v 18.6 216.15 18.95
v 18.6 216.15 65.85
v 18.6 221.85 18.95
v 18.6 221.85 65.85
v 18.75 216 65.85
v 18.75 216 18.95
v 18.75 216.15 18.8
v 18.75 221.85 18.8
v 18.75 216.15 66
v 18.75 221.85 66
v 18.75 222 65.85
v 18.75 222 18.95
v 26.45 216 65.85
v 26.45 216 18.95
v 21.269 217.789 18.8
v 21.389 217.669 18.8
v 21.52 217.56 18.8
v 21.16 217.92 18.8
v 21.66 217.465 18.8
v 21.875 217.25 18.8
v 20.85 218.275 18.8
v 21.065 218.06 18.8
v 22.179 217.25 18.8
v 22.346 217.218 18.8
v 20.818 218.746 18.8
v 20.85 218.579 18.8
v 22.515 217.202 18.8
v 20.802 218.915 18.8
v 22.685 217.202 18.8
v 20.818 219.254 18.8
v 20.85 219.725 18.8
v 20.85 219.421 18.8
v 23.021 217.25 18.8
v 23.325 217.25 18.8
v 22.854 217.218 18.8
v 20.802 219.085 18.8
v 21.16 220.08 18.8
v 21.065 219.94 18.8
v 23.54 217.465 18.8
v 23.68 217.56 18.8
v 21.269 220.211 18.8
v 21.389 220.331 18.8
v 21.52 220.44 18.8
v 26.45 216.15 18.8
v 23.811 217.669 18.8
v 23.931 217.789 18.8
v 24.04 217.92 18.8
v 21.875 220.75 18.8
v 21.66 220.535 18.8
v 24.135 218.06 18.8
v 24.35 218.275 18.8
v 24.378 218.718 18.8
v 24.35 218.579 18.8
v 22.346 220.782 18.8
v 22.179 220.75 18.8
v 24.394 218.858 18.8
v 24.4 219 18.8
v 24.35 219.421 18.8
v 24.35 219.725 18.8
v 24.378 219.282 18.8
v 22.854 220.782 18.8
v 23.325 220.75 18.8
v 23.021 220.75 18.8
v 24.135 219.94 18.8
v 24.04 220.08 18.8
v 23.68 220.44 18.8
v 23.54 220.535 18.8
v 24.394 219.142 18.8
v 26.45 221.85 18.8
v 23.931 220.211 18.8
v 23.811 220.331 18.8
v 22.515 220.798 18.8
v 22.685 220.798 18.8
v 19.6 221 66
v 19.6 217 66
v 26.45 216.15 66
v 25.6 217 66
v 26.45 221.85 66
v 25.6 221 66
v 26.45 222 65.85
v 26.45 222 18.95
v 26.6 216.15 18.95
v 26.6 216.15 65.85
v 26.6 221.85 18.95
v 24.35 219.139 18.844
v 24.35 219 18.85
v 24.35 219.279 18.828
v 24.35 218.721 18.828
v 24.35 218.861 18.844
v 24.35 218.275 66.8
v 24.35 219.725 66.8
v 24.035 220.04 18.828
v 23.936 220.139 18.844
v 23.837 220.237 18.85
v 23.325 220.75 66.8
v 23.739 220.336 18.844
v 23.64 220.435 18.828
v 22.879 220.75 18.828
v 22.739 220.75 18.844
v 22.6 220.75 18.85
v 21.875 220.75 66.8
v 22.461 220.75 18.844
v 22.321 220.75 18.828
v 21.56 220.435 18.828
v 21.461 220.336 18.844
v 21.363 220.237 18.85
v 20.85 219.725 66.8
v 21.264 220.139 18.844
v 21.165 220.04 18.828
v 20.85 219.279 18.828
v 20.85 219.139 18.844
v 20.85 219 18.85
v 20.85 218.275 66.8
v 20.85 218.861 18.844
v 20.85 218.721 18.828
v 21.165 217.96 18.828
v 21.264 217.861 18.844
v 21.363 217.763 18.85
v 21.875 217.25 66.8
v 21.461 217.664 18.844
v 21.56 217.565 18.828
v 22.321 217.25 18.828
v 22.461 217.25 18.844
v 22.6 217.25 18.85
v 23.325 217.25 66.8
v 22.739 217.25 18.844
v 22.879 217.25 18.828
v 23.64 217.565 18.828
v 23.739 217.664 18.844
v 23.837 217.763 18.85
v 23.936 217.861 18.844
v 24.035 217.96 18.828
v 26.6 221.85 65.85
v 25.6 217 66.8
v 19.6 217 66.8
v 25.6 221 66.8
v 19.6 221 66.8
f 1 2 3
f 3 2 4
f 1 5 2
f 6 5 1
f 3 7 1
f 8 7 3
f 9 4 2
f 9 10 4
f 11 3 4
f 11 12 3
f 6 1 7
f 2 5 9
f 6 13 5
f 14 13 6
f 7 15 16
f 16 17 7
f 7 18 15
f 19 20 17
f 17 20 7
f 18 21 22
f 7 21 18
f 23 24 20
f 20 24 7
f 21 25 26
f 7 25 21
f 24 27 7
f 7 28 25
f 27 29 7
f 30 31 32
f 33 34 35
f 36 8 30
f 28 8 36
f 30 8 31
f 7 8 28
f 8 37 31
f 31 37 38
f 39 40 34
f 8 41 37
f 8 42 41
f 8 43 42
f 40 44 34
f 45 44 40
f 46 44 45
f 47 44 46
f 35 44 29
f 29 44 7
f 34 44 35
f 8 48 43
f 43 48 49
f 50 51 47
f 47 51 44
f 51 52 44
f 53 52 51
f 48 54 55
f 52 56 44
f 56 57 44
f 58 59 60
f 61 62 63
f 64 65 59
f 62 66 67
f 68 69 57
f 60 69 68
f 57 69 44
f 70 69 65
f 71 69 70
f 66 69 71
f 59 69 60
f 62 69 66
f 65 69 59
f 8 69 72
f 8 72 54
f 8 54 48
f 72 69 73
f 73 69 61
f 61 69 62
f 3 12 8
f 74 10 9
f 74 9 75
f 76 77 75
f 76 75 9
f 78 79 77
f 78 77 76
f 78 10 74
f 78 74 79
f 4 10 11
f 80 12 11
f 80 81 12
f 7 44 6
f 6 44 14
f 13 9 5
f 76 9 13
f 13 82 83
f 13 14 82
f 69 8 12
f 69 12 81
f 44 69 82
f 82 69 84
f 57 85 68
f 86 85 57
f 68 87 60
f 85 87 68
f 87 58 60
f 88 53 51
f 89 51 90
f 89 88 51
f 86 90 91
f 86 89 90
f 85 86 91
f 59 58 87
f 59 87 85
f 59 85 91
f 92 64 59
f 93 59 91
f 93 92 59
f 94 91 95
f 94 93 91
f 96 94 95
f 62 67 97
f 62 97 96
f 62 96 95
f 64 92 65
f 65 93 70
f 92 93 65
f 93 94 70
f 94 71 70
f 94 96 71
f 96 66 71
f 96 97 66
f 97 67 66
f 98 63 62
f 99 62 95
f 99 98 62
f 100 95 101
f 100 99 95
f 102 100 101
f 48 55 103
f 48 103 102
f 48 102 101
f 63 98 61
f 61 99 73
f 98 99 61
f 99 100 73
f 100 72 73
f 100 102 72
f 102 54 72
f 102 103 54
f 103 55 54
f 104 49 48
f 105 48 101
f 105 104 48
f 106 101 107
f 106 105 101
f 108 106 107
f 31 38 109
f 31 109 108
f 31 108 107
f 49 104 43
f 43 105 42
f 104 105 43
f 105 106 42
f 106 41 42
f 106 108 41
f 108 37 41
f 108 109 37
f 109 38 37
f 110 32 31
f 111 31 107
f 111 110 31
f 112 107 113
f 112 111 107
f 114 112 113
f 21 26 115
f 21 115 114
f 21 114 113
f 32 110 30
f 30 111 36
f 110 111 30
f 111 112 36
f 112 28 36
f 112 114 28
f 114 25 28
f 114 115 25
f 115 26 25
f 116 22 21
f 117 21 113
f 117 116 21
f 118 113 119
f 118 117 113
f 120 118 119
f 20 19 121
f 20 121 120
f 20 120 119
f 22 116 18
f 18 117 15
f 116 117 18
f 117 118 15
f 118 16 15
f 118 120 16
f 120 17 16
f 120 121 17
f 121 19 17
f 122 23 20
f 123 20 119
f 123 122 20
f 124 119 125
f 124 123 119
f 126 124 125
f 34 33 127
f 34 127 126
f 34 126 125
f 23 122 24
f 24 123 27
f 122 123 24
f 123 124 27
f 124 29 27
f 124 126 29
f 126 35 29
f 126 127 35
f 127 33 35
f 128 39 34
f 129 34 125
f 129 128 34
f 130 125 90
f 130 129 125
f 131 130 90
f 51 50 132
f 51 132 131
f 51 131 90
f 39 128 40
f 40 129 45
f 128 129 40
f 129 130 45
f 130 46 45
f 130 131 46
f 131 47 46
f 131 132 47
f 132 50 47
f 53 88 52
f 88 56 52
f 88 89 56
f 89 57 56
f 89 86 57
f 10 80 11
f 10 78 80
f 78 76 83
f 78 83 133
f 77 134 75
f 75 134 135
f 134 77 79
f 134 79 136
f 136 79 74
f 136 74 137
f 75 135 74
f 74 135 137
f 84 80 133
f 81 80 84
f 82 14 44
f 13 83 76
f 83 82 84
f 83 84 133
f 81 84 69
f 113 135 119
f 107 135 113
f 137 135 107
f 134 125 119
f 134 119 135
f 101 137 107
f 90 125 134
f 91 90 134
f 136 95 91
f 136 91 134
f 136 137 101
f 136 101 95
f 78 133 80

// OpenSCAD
// Generated by the canonical parent Python sources and validated exchange pipeline.
polyhedron(points=[[18.600000381469727, 216.14999389648438, 18.950000762939453], [18.600000381469727, 216.14999389648438, 65.8499984741211], [18.600000381469727, 221.85000610351562, 18.950000762939453], [18.600000381469727, 221.85000610351562, 65.8499984741211], [18.75, 216.0, 65.8499984741211], [18.75, 216.0, 18.950000762939453], [18.75, 216.14999389648438, 18.799999237060547], [18.75, 221.85000610351562, 18.799999237060547], [18.75, 216.14999389648438, 66.0], [18.75, 221.85000610351562, 66.0], [18.75, 222.0, 65.8499984741211], [18.75, 222.0, 18.950000762939453], [26.450000762939453, 216.0, 65.8499984741211], [26.450000762939453, 216.0, 18.950000762939453], [21.268510818481445, 217.7887420654297, 18.799999237060547], [21.38874626159668, 217.66851806640625, 18.799999237060547], [21.51978874206543, 217.56016540527344, 18.799999237060547], [21.160158157348633, 217.91978454589844, 18.799999237060547], [21.660472869873047, 217.46466064453125, 18.799999237060547], [21.875125885009766, 217.25, 18.799999237060547], [20.850000381469727, 218.27513122558594, 18.799999237060547], [21.064653396606445, 218.0604705810547, 18.799999237060547], [22.178691864013672, 217.25, 18.799999237060547], [22.345703125, 217.21804809570312, 18.799999237060547], [20.81805419921875, 218.74569702148438, 18.799999237060547], [20.850000381469727, 218.5786895751953, 18.799999237060547], [22.51498031616211, 217.20201110839844, 18.799999237060547], [20.80200958251953, 218.91497802734375, 18.799999237060547], [22.68501853942871, 217.20201110839844, 18.799999237060547], [20.81805419921875, 219.25430297851562, 18.799999237060547], [20.850000381469727, 219.72486877441406, 18.799999237060547], [20.850000381469727, 219.4213104248047, 18.799999237060547], [23.02130699157715, 217.25, 18.799999237060547], [23.324872970581055, 217.25, 18.799999237060547], [22.854297637939453, 217.21804809570312, 18.799999237060547], [20.80200958251953, 219.08502197265625, 18.799999237060547], [21.160158157348633, 220.08021545410156, 18.799999237060547], [21.064653396606445, 219.9395294189453, 18.799999237060547], [23.539527893066406, 217.46466064453125, 18.799999237060547], [23.68021011352539, 217.56016540527344, 18.799999237060547], [21.268510818481445, 220.2112579345703, 18.799999237060547], [21.38874626159668, 220.33148193359375, 18.799999237060547], [21.51978874206543, 220.43983459472656, 18.799999237060547], [26.450000762939453, 216.14999389648438, 18.799999237060547], [23.811254501342773, 217.66851806640625, 18.799999237060547], [23.931489944458008, 217.7887420654297, 18.799999237060547], [24.03984260559082, 217.91978454589844, 18.799999237060547], [21.875125885009766, 220.75, 18.799999237060547], [21.660472869873047, 220.53533935546875, 18.799999237060547], [24.135345458984375, 218.0604705810547, 18.799999237060547], [24.350000381469727, 218.27513122558594, 18.799999237060547], [24.37771987915039, 218.71766662597656, 18.799999237060547], [24.350000381469727, 218.5786895751953, 18.799999237060547], [22.345703125, 220.78195190429688, 18.799999237060547], [22.178691864013672, 220.75, 18.799999237060547], [24.394420623779297, 218.8583984375, 18.799999237060547], [24.399999618530273, 219.0, 18.799999237060547], [24.350000381469727, 219.4213104248047, 18.799999237060547], [24.350000381469727, 219.72486877441406, 18.799999237060547], [24.37771987915039, 219.28233337402344, 18.799999237060547], [22.854297637939453, 220.78195190429688, 18.799999237060547], [23.324872970581055, 220.75, 18.799999237060547], [23.02130699157715, 220.75, 18.799999237060547], [24.135345458984375, 219.9395294189453, 18.799999237060547], [24.03984260559082, 220.08021545410156, 18.799999237060547], [23.68021011352539, 220.43983459472656, 18.799999237060547], [23.539527893066406, 220.53533935546875, 18.799999237060547], [24.394420623779297, 219.1416015625, 18.799999237060547], [26.450000762939453, 221.85000610351562, 18.799999237060547], [23.931489944458008, 220.2112579345703, 18.799999237060547], [23.811254501342773, 220.33148193359375, 18.799999237060547], [22.51498031616211, 220.79798889160156, 18.799999237060547], [22.68501853942871, 220.79798889160156, 18.799999237060547], [19.600000381469727, 221.0, 66.0], [19.600000381469727, 217.0, 66.0], [26.450000762939453, 216.14999389648438, 66.0], [25.600000381469727, 217.0, 66.0], [26.450000762939453, 221.85000610351562, 66.0], [25.600000381469727, 221.0, 66.0], [26.450000762939453, 222.0, 65.8499984741211], [26.450000762939453, 222.0, 18.950000762939453], [26.600000381469727, 216.14999389648438, 18.950000762939453], [26.600000381469727, 216.14999389648438, 65.8499984741211], [26.600000381469727, 221.85000610351562, 18.950000762939453], [24.350000381469727, 219.13926696777344, 18.844467163085938], [24.350000381469727, 219.0, 18.850000381469727], [24.350000381469727, 219.27940368652344, 18.827836990356445], [24.350000381469727, 218.72059631347656, 18.827836990356445], [24.350000381469727, 218.86073303222656, 18.844467163085938], [24.350000381469727, 218.27513122558594, 66.80000305175781], [24.350000381469727, 219.72486877441406, 66.80000305175781], [24.035003662109375, 220.0398712158203, 18.827836990356445], [23.935909271240234, 220.1389617919922, 18.844467163085938], [23.83743667602539, 220.23744201660156, 18.850000381469727], [23.324872970581055, 220.75, 66.80000305175781], [23.73896598815918, 220.33590698242188, 18.844467163085938], [23.63987159729004, 220.43499755859375, 18.827836990356445], [22.8794002532959, 220.75, 18.827836990356445], [22.739259719848633, 220.75, 18.844467163085938], [22.600000381469727, 220.75, 18.850000381469727], [21.875125885009766, 220.75, 66.80000305175781], [22.460739135742188, 220.75, 18.844467163085938], [22.320598602294922, 220.75, 18.827836990356445], [21.560129165649414, 220.43499755859375, 18.827836990356445], [21.461034774780273, 220.33590698242188, 18.844467163085938], [21.36256217956543, 220.23744201660156, 18.850000381469727], [20.850000381469727, 219.72486877441406, 66.80000305175781], [21.26409149169922, 220.1389617919922, 18.844467163085938], [21.164997100830078, 220.0398712158203, 18.827836990356445], [20.850000381469727, 219.27940368652344, 18.827836990356445], [20.850000381469727, 219.13926696777344, 18.844467163085938], [20.850000381469727, 219.0, 18.850000381469727], [20.850000381469727, 218.27513122558594, 66.80000305175781], [20.850000381469727, 218.86073303222656, 18.844467163085938], [20.850000381469727, 218.72059631347656, 18.827836990356445], [21.164997100830078, 217.9601287841797, 18.827836990356445], [21.26409149169922, 217.8610382080078, 18.844467163085938], [21.362564086914062, 217.76255798339844, 18.850000381469727], [21.875125885009766, 217.25, 66.80000305175781], [21.461034774780273, 217.66409301757812, 18.844467163085938], [21.560129165649414, 217.56500244140625, 18.827836990356445], [22.320598602294922, 217.25, 18.827836990356445], [22.460739135742188, 217.25, 18.844467163085938], [22.600000381469727, 217.25, 18.850000381469727], [23.324872970581055, 217.25, 66.80000305175781], [22.739259719848633, 217.25, 18.844467163085938], [22.8794002532959, 217.25, 18.827836990356445], [23.63987159729004, 217.56500244140625, 18.827836990356445], [23.73896598815918, 217.66409301757812, 18.844467163085938], [23.83743667602539, 217.76255798339844, 18.850000381469727], [23.935909271240234, 217.8610382080078, 18.844467163085938], [24.035003662109375, 217.9601287841797, 18.827836990356445], [26.600000381469727, 221.85000610351562, 65.8499984741211], [25.600000381469727, 217.0, 66.80000305175781], [19.600000381469727, 217.0, 66.80000305175781], [25.600000381469727, 221.0, 66.80000305175781], [19.600000381469727, 221.0, 66.80000305175781]],faces=[[2, 1, 0], [3, 1, 2], [1, 4, 0], [0, 4, 5], [0, 6, 2], [2, 6, 7], [1, 3, 8], [3, 9, 8], [3, 2, 10], [2, 11, 10], [6, 0, 5], [8, 4, 1], [4, 12, 5], [5, 12, 13], [15, 14, 6], [6, 16, 15], [14, 17, 6], [16, 19, 18], [6, 19, 16], [21, 20, 17], [17, 20, 6], [19, 23, 22], [6, 23, 19], [25, 24, 20], [20, 24, 6], [6, 26, 23], [24, 27, 6], [6, 28, 26], [31, 30, 29], [34, 33, 32], [29, 7, 35], [35, 7, 27], [30, 7, 29], [27, 7, 6], [30, 36, 7], [37, 36, 30], [33, 39, 38], [36, 40, 7], [40, 41, 7], [41, 42, 7], [33, 43, 39], [39, 43, 44], [44, 43, 45], [45, 43, 46], [28, 43, 34], [6, 43, 28], [34, 43, 33], [42, 47, 7], [48, 47, 42], [46, 50, 49], [43, 50, 46], [43, 51, 50], [50, 51, 52], [54, 53, 47], [43, 55, 51], [43, 56, 55], [59, 58, 57], [62, 61, 60], [58, 64, 63], [66, 65, 61], [56, 68, 67], [67, 68, 59], [43, 68, 56], [64, 68, 69], [69, 68, 70], [70, 68, 65], [59, 68, 58], [65, 68, 61], [58, 68, 64], [71, 68, 7], [53, 71, 7], [47, 53, 7], [72, 68, 71], [60, 68, 72], [61, 68, 60], [7, 11, 2], [8, 9, 73], [74, 8, 73], [74, 76, 75], [8, 74, 75], [76, 78, 77], [75, 76, 77], [73, 9, 77], [78, 73, 77], [10, 9, 3], [10, 11, 79], [11, 80, 79], [5, 43, 6], [13, 43, 5], [4, 8, 12], [12, 8, 75], [82, 81, 12], [81, 13, 12], [11, 7, 68], [80, 11, 68], [81, 68, 43], [83, 68, 81], [67, 84, 56], [56, 84, 85], [59, 86, 67], [67, 86, 84], [59, 57, 86], [50, 52, 87], [89, 50, 88], [50, 87, 88], [90, 89, 85], [89, 88, 85], [90, 85, 84], [86, 57, 58], [84, 86, 58], [90, 84, 58], [58, 63, 91], [90, 58, 92], [58, 91, 92], [94, 90, 93], [90, 92, 93], [94, 93, 95], [96, 66, 61], [95, 96, 61], [94, 95, 61], [64, 91, 63], [69, 92, 64], [64, 92, 91], [69, 93, 92], [69, 70, 93], [70, 95, 93], [70, 65, 95], [65, 96, 95], [65, 66, 96], [61, 62, 97], [94, 61, 98], [61, 97, 98], [100, 94, 99], [94, 98, 99], [100, 99, 101], [102, 54, 47], [101, 102, 47], [100, 101, 47], [60, 97, 62], [72, 98, 60], [60, 98, 97], [72, 99, 98], [72, 71, 99], [71, 101, 99], [71, 53, 101], [53, 102, 101], [53, 54, 102], [47, 48, 103], [100, 47, 104], [47, 103, 104], [106, 100, 105], [100, 104, 105], [106, 105, 107], [108, 37, 30], [107, 108, 30], [106, 107, 30], [42, 103, 48], [41, 104, 42], [42, 104, 103], [41, 105, 104], [41, 40, 105], [40, 107, 105], [40, 36, 107], [36, 108, 107], [36, 37, 108], [30, 31, 109], [106, 30, 110], [30, 109, 110], [112, 106, 111], [106, 110, 111], [112, 111, 113], [114, 25, 20], [113, 114, 20], [112, 113, 20], [29, 109, 31], [35, 110, 29], [29, 110, 109], [35, 111, 110], [35, 27, 111], [27, 113, 111], [27, 24, 113], [24, 114, 113], [24, 25, 114], [20, 21, 115], [112, 20, 116], [20, 115, 116], [118, 112, 117], [112, 116, 117], [118, 117, 119], [120, 18, 19], [119, 120, 19], [118, 119, 19], [17, 115, 21], [14, 116, 17], [17, 116, 115], [14, 117, 116], [14, 15, 117], [15, 119, 117], [15, 16, 119], [16, 120, 119], [16, 18, 120], [19, 22, 121], [118, 19, 122], [19, 121, 122], [124, 118, 123], [118, 122, 123], [124, 123, 125], [126, 32, 33], [125, 126, 33], [124, 125, 33], [23, 121, 22], [26, 122, 23], [23, 122, 121], [26, 123, 122], [26, 28, 123], [28, 125, 123], [28, 34, 125], [34, 126, 125], [34, 32, 126], [33, 38, 127], [124, 33, 128], [33, 127, 128], [89, 124, 129], [124, 128, 129], [89, 129, 130], [131, 49, 50], [130, 131, 50], [89, 130, 50], [39, 127, 38], [44, 128, 39], [39, 128, 127], [44, 129, 128], [44, 45, 129], [45, 130, 129], [45, 46, 130], [46, 131, 130], [46, 49, 131], [51, 87, 52], [51, 55, 87], [55, 88, 87], [55, 56, 88], [56, 85, 88], [10, 79, 9], [79, 77, 9], [82, 75, 77], [132, 82, 77], [74, 133, 76], [134, 133, 74], [78, 76, 133], [135, 78, 133], [73, 78, 135], [136, 73, 135], [73, 134, 74], [136, 134, 73], [132, 79, 83], [83, 79, 80], [43, 13, 81], [75, 82, 12], [83, 81, 82], [132, 83, 82], [68, 83, 80], [118, 134, 112], [112, 134, 106], [106, 134, 136], [118, 124, 133], [134, 118, 133], [106, 136, 100], [133, 124, 89], [133, 89, 90], [90, 94, 135], [133, 90, 135], [100, 136, 135], [94, 100, 135], [79, 132, 77]],convexity=10);
